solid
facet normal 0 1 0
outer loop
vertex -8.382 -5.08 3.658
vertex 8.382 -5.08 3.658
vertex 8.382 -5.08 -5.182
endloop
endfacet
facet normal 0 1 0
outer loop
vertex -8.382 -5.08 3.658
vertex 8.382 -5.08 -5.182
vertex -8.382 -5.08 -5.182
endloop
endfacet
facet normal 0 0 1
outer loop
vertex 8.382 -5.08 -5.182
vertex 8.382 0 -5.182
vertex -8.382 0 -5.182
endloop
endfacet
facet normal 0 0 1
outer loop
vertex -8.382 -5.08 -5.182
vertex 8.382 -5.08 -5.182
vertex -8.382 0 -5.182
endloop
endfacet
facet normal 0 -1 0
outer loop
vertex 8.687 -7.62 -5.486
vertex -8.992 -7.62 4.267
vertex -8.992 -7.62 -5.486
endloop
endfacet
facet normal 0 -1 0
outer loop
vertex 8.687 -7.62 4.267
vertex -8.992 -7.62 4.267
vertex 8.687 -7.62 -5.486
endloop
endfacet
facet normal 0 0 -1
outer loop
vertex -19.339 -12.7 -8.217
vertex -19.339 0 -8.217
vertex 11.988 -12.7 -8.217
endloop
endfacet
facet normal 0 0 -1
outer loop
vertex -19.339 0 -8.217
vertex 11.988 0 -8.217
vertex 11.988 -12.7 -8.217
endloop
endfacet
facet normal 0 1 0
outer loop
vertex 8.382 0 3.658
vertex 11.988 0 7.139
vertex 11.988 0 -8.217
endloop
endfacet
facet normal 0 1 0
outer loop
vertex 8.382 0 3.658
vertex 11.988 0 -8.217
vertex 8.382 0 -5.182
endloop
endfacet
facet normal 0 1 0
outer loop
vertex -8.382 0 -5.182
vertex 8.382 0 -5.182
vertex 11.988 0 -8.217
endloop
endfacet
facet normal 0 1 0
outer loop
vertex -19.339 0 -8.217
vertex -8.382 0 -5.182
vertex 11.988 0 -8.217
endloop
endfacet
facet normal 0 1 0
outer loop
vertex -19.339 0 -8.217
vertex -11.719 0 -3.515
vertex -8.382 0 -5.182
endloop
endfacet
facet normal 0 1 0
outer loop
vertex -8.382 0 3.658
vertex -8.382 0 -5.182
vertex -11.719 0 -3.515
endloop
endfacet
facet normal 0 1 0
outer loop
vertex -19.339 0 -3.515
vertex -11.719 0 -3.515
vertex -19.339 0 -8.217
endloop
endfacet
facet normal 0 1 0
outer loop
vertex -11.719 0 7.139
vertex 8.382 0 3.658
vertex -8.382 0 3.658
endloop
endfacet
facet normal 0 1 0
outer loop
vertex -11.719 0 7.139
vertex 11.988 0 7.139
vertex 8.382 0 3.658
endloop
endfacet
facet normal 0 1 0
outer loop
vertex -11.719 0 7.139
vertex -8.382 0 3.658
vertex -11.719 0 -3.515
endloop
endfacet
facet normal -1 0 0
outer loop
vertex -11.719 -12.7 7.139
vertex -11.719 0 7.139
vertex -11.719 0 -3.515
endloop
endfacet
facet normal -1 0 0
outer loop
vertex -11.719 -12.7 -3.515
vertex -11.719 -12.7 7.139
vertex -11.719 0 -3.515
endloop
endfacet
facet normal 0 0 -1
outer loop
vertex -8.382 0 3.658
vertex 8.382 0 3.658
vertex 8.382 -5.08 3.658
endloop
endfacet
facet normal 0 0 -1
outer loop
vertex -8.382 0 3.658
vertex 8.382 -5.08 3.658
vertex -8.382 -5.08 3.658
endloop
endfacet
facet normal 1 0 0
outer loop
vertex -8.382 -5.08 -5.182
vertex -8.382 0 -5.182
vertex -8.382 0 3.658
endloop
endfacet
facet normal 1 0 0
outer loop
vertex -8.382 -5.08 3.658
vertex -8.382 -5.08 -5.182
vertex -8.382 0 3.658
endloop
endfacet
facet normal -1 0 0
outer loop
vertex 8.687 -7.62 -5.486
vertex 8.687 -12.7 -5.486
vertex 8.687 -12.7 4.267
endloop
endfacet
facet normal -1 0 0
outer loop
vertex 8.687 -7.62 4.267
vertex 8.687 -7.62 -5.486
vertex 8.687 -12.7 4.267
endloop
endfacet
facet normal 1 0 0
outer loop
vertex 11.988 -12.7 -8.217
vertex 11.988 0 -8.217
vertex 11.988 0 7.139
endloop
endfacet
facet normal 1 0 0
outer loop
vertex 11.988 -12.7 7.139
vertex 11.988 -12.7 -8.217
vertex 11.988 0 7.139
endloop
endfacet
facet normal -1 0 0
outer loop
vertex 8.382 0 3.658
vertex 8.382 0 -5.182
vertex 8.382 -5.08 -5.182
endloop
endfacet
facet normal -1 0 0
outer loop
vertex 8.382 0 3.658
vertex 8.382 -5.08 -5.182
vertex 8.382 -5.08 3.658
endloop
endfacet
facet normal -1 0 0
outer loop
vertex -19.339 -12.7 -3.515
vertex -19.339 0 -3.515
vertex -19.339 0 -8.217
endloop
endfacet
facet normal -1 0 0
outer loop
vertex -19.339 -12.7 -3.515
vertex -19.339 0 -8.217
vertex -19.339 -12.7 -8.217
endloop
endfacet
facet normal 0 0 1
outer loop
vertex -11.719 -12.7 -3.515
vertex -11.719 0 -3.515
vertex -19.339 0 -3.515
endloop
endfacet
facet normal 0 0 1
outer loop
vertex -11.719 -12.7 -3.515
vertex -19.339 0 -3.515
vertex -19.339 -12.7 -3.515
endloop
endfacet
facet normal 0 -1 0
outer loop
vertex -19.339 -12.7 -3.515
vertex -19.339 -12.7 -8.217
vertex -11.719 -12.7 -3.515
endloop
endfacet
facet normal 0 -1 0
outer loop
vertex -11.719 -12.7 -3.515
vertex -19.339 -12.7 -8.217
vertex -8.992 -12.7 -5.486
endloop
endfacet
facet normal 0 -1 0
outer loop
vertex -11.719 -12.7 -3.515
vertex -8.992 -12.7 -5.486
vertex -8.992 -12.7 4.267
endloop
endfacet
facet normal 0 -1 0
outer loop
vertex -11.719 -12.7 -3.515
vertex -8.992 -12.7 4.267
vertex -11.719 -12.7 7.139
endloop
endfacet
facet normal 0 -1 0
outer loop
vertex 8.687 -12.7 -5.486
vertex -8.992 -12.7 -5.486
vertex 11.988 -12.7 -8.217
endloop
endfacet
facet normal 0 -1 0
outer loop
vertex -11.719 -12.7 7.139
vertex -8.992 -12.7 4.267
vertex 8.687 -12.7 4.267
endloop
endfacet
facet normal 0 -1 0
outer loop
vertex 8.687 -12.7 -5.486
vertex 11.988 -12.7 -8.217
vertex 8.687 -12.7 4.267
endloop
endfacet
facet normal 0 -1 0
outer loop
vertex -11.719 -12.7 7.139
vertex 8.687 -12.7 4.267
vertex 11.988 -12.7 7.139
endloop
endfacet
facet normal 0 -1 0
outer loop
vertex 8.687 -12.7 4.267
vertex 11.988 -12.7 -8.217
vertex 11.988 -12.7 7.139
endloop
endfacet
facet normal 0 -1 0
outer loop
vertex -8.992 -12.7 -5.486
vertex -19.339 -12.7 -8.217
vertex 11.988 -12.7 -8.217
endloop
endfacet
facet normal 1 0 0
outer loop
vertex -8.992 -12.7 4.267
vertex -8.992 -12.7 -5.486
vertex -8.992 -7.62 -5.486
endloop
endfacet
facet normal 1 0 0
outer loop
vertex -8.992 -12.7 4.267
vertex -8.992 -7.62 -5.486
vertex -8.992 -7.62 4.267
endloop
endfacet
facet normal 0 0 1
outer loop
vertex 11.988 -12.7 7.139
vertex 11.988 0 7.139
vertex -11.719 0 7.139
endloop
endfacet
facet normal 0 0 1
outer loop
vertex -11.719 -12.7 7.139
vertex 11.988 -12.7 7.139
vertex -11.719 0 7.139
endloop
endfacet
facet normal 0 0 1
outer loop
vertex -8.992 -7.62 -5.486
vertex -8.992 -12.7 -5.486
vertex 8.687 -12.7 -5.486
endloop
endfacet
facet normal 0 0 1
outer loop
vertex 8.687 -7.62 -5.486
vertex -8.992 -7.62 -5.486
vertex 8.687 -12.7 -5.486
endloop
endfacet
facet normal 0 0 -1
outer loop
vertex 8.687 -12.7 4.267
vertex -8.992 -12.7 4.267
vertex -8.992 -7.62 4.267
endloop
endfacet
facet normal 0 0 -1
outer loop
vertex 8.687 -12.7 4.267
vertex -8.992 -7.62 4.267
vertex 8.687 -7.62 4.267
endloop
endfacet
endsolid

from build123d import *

# Parameters (mm, degrees)
F1_DEPTH  = 12.7
F2_W      = 19.4173352793
F2_H      = 11.3267796114
F3_DEPTH  = 5.08
F4_W      = 12.7
F4_H      = 4.7013934236
F5_DEPTH  = 7.62
F6_DEPTH  = 5.08
F7_W      = 17.6784014329
F7_H      = 9.7536002286
F8_DEPTH  = 5.08
F9_W      = 16.7640009895
F9_H      = 8.8392002508
F10_DEPTH = 5.08


with BuildPart() as f1:
    # F0 (on Front) → F1 (new body)
    with BuildSketch(Plane.XZ):
        Polygon((11.9880298153, 7.1389395744), (-11.7186363786, 7.1389395744), (-11.7186363786, -8.2165151834), (11.9880298153, -8.2165151834), (11.9880298153, -2.5592423044), align=None)
    extrude(amount=F1_DEPTH)

    # F2 (on face) → F3 (cut)
    with BuildSketch(Plane(origin=(0, 0, 0), x_dir=(-1, 0, 0), z_dir=(0, 1, 0))):
        with Locations((-0.2076723613, -0.6256373599)):
            Rectangle(F2_W, F2_H)
    extrude(amount=-F3_DEPTH, mode=Mode.SUBTRACT)

    # F4 (on face) → F5 (join)
    with BuildSketch(Plane(origin=(-11.7186363786, 0, 0), x_dir=(0, -1, 0), z_dir=(-1, 0, 0))):
        with Locations((6.35, -5.8658184716)):
            Rectangle(F4_W, F4_H)
    extrude(amount=F5_DEPTH)

    # F6 (add): a face of the model
    f6_faces = [f1.faces().sort_by_distance(p)[0] for p in [
        (0.2076723613, -5.08, -0.6256373599),
    ]]
    extrude(f6_faces, amount=F6_DEPTH)

    # F7 (on face) → F8 (cut)
    with BuildSketch(Plane.XZ.offset(12.7)):
        with Locations((-0.1524002291, -0.6095997524)):
            Rectangle(F7_W, F7_H)
    extrude(amount=-F8_DEPTH, mode=Mode.SUBTRACT)

    # F9 (on face) → F10 (cut)
    with BuildSketch(Plane(origin=(0, 0, 0), x_dir=(-1, 0, 0), z_dir=(0, 1, 0))):
        with Locations((-4.657e-07, -0.7620002143)):
            Rectangle(F9_W, F9_H)
    extrude(amount=-F10_DEPTH, mode=Mode.SUBTRACT)


solid = f1.part
